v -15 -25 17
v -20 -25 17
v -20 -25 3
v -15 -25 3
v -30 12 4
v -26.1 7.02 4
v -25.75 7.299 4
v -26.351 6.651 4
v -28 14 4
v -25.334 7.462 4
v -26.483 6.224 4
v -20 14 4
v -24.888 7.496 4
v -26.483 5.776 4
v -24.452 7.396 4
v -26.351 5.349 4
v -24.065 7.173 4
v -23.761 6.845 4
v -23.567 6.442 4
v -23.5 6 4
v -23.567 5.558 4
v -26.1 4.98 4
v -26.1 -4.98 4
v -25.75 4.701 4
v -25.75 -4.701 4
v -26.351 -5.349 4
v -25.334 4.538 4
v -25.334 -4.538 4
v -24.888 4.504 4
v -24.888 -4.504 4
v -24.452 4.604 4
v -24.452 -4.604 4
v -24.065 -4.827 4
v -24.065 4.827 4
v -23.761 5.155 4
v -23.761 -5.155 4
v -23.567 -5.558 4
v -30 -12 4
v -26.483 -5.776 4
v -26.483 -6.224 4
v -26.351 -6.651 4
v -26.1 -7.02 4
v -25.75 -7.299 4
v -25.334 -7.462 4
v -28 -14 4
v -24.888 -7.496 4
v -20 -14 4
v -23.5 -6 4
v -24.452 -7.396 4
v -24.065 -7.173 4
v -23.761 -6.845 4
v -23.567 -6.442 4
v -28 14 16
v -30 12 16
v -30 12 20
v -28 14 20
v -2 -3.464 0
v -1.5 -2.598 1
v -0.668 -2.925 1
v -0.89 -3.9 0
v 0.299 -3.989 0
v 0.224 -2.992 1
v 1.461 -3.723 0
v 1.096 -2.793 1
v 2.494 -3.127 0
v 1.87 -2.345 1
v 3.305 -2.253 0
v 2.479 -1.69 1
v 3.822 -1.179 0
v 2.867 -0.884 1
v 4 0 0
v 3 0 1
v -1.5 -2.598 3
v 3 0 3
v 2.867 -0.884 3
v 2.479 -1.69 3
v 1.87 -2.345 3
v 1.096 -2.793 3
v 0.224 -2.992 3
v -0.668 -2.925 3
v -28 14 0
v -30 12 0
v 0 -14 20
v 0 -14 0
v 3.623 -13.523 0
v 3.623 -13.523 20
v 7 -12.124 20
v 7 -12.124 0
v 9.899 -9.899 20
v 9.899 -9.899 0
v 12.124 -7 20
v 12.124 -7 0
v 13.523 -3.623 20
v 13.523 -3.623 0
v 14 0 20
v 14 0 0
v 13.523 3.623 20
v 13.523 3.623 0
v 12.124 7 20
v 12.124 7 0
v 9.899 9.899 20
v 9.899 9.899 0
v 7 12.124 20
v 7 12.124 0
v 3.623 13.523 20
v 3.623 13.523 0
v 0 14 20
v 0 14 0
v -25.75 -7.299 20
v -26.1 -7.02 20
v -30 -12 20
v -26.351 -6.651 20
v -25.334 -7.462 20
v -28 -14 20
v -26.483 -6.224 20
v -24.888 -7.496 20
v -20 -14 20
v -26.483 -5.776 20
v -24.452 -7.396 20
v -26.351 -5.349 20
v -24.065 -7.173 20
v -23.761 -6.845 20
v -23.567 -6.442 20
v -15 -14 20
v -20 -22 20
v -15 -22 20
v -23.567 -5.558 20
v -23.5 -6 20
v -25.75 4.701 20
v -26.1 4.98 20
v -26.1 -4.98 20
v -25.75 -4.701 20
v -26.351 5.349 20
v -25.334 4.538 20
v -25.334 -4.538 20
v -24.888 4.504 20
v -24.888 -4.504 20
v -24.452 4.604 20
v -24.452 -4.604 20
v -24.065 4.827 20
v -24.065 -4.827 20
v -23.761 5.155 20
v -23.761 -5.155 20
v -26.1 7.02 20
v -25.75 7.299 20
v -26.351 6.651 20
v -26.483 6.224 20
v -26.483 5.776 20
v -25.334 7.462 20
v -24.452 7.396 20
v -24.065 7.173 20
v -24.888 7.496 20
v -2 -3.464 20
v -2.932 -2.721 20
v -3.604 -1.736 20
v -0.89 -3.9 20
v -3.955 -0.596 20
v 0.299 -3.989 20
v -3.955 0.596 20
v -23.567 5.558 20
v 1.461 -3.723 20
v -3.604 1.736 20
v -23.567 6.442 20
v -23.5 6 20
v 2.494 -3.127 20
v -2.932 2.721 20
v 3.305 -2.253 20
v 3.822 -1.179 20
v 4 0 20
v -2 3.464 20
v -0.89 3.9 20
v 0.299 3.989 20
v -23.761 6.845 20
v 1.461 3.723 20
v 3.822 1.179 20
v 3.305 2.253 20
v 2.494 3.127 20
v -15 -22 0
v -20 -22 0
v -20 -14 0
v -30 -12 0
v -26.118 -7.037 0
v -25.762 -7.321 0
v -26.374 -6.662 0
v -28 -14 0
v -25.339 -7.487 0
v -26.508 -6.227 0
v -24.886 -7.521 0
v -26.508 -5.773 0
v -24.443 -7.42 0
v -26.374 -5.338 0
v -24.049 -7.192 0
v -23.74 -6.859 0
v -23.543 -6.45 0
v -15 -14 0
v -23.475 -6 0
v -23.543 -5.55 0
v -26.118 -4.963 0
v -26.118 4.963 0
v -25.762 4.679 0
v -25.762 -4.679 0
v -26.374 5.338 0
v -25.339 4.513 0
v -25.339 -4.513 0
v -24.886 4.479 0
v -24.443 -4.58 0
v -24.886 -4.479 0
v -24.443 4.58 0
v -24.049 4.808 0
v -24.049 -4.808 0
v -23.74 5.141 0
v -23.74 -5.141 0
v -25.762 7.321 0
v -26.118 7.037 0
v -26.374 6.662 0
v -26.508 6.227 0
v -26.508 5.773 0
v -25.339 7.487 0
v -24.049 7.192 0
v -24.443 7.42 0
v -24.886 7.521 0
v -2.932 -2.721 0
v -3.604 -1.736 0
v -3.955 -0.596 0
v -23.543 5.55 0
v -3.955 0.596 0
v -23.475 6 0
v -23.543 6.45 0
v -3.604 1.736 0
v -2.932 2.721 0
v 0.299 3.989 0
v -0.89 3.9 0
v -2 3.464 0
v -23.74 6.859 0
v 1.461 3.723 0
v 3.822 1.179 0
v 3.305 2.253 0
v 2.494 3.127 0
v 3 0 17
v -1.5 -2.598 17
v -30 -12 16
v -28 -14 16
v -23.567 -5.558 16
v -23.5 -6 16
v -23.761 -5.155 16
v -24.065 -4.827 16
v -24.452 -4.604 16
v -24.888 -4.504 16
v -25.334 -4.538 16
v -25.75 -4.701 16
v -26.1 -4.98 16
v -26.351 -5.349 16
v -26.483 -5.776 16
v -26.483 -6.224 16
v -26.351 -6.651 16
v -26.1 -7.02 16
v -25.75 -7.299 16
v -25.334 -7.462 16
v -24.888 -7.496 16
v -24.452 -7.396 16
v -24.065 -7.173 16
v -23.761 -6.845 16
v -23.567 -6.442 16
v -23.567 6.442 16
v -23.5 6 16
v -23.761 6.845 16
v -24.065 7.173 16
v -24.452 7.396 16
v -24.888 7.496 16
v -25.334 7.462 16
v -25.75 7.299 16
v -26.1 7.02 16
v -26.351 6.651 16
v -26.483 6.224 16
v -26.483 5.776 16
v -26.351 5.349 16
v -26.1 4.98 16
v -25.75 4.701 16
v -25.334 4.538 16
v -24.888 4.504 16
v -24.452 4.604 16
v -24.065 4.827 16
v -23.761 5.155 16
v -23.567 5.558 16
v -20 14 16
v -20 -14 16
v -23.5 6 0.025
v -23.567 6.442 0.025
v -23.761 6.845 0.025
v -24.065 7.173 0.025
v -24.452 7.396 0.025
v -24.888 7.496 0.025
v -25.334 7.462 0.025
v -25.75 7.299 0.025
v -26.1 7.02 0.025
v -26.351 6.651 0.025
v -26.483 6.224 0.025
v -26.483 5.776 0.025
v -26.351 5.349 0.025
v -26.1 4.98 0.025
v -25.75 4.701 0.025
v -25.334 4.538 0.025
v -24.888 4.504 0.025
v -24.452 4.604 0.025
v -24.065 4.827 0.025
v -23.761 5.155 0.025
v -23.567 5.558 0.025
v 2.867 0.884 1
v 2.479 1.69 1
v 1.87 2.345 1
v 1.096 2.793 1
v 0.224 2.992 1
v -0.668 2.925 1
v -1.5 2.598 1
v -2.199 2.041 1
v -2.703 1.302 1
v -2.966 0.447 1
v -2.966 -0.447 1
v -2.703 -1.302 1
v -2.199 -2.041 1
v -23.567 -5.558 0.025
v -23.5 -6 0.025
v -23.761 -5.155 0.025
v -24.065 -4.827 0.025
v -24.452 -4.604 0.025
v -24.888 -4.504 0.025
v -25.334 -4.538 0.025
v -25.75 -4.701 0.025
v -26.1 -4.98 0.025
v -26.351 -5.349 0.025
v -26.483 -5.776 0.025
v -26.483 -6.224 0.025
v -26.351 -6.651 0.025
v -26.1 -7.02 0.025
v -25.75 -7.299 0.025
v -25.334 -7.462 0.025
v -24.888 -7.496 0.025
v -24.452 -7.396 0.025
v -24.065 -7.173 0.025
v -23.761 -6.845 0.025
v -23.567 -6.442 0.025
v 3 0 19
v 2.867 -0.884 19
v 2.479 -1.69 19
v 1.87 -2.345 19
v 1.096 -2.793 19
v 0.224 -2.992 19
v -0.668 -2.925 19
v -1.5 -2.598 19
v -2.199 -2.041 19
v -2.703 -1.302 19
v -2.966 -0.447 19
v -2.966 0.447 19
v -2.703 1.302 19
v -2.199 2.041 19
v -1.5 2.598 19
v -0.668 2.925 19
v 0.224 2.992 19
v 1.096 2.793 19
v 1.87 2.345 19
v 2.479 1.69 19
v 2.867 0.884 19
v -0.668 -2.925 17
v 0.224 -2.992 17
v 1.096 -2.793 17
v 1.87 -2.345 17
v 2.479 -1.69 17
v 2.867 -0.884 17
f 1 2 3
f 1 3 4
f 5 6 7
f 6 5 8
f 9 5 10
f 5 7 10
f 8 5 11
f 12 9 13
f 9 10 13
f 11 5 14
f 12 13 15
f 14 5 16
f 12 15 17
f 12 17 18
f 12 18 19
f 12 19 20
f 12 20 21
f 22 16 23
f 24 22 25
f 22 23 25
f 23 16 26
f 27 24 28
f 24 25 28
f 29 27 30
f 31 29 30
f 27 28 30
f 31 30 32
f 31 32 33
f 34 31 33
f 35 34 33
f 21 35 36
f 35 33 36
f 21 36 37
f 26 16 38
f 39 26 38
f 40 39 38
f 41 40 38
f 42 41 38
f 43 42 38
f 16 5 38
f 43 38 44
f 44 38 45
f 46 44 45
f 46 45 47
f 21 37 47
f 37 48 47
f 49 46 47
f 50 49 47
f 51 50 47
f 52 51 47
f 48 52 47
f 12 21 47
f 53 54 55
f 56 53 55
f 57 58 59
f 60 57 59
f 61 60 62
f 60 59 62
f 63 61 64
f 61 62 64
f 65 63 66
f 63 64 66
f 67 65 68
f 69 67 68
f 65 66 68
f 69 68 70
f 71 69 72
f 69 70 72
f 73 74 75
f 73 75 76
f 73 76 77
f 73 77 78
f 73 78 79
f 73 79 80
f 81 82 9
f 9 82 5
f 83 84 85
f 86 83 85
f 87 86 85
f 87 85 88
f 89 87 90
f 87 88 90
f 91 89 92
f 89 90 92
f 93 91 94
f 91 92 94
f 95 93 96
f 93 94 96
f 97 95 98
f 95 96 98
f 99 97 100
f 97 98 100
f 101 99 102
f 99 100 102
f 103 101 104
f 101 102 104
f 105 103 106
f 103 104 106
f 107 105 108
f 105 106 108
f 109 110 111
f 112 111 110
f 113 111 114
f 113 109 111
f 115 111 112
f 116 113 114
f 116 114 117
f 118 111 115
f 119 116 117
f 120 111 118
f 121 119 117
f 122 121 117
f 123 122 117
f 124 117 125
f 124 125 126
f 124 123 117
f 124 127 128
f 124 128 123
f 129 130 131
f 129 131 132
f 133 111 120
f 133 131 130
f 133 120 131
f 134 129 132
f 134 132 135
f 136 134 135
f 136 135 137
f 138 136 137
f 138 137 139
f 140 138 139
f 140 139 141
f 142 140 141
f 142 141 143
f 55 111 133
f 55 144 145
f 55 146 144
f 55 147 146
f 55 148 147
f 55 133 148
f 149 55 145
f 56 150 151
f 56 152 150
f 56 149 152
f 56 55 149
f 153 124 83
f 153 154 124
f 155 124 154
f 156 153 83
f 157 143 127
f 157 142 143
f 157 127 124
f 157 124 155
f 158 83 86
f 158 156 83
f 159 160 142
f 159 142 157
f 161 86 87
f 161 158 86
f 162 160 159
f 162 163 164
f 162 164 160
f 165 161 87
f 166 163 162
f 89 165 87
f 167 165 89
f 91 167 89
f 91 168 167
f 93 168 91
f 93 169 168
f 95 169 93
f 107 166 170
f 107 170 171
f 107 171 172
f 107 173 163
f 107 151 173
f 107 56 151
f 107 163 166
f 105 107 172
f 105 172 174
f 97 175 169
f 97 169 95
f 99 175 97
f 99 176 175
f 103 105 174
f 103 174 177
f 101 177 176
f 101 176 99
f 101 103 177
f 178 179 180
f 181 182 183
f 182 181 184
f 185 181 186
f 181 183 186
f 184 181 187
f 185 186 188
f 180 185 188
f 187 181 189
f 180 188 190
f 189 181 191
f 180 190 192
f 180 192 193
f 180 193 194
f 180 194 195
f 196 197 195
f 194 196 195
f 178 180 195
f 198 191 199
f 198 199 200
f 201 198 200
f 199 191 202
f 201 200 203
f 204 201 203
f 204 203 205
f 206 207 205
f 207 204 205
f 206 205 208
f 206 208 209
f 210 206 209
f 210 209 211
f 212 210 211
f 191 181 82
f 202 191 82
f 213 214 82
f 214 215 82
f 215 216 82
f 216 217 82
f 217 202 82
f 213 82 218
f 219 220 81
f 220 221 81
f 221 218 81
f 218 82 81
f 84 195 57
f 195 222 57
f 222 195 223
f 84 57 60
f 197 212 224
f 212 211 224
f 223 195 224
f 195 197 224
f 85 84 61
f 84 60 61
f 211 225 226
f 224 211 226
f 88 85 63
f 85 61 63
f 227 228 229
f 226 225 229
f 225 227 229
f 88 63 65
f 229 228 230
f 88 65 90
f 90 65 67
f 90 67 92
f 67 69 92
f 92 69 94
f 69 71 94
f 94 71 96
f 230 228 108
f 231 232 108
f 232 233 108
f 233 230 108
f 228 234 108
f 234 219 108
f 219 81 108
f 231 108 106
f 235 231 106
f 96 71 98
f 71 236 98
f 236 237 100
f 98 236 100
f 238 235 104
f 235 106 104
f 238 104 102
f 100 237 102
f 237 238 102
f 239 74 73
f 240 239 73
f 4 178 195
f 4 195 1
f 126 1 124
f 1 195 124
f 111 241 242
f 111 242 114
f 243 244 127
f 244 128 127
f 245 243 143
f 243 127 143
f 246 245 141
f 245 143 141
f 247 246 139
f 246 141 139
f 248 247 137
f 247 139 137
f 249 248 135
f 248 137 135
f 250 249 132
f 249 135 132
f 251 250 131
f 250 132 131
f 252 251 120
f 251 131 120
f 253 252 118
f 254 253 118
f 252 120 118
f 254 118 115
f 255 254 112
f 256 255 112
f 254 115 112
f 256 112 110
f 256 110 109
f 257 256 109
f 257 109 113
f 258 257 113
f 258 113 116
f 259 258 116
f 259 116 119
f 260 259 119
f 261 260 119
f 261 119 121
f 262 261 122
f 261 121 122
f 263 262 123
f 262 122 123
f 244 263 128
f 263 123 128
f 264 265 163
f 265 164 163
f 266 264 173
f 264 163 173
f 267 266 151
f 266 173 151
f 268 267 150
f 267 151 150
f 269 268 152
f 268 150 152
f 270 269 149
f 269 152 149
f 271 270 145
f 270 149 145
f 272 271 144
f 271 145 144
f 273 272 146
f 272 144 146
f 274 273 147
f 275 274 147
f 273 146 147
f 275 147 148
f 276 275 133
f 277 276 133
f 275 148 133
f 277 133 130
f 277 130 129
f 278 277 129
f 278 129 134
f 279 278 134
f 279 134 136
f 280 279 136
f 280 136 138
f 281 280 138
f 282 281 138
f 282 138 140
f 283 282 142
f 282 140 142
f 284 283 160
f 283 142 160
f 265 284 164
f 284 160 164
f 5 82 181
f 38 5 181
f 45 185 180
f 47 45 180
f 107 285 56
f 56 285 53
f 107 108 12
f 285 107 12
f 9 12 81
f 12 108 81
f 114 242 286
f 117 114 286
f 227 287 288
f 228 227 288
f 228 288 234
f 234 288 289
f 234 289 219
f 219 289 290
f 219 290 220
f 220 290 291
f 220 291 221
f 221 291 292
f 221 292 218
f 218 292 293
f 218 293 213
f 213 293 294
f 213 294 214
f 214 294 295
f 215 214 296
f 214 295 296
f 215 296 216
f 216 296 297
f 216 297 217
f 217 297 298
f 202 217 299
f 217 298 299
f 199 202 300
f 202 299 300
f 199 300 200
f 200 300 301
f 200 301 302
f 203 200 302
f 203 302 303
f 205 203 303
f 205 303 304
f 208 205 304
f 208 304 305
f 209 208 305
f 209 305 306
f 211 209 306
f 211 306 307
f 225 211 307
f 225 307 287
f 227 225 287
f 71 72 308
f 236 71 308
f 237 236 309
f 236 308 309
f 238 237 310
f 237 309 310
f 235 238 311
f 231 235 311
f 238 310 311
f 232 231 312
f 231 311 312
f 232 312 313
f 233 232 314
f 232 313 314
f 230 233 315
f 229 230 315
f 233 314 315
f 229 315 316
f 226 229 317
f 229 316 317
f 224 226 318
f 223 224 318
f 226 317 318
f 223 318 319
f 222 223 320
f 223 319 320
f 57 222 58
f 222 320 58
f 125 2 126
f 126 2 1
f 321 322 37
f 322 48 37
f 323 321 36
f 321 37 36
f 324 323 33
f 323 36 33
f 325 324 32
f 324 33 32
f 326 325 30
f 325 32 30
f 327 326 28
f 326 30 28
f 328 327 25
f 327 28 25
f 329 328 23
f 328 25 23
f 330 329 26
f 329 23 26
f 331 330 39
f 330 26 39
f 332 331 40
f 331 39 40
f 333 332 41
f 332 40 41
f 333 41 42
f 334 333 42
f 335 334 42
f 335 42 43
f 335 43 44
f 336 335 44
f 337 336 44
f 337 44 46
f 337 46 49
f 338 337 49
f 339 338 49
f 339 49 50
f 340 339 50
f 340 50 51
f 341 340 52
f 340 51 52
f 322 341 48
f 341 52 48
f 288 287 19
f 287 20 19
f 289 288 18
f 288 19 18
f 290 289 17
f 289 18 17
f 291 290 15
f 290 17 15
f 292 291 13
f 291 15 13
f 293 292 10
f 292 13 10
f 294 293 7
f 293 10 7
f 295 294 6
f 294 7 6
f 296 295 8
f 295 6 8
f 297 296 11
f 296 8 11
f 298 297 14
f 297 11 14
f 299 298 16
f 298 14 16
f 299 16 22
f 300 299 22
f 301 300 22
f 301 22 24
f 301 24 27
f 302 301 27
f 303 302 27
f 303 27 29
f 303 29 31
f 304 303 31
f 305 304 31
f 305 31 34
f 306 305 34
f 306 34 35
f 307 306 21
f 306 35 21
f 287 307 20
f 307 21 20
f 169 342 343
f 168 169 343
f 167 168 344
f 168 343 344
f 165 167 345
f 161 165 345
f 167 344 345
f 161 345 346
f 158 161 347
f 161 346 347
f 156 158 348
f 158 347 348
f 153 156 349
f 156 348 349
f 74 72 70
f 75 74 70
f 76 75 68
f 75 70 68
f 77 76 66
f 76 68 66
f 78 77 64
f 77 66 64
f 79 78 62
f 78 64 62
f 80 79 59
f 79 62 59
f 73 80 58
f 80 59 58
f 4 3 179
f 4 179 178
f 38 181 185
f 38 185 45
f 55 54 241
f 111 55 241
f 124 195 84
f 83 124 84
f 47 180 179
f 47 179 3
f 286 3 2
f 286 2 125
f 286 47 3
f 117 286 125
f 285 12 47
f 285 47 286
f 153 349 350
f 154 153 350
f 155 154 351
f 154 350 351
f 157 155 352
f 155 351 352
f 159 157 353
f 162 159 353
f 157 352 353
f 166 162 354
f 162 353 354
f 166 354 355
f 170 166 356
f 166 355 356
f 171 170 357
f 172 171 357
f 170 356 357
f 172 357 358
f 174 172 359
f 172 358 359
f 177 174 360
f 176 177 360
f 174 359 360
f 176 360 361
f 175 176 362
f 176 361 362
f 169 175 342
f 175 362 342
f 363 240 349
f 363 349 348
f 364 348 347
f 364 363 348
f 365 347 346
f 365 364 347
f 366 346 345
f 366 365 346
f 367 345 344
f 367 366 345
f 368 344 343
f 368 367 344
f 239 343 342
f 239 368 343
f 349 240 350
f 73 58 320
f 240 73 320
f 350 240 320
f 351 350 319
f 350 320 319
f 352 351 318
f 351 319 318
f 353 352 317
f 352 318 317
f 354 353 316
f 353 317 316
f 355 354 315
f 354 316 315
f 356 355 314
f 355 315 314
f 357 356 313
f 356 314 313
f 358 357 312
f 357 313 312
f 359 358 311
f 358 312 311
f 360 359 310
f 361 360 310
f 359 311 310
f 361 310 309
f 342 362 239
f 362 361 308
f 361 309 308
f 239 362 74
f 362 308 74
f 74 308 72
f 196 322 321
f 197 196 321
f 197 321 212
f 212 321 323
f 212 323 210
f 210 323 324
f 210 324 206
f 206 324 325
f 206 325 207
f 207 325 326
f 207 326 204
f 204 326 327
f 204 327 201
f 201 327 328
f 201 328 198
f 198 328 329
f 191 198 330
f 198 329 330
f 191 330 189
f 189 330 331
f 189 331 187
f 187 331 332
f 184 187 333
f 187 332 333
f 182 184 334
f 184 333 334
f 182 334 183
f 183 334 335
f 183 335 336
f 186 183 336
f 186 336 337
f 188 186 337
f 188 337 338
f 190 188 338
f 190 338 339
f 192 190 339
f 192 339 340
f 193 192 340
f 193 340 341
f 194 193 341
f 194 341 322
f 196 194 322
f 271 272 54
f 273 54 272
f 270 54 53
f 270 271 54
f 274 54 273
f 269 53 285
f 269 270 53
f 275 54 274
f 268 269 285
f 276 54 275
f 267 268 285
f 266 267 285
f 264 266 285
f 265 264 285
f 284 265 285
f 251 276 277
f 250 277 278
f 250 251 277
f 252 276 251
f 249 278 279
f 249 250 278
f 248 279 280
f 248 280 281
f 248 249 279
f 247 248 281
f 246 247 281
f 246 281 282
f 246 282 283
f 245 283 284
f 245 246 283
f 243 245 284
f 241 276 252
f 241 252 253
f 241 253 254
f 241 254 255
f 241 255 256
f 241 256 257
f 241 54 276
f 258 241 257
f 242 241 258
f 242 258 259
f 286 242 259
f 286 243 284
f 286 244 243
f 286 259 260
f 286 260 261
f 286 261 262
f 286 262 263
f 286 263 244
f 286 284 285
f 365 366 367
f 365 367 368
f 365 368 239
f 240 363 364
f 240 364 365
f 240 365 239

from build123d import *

# Parameters (mm, degrees)
EXTRUDE_1_DEPTH       = 20
CUT_EXTRUDE_1_DEPTH   = 39.678159
SKETCH_5_R            = 3
CUT_EXTRUDE_2_DEPTH   = 3
SKETCH_6_W            = 10
SKETCH_6_H            = 12
CUT_EXTRUDE_3_DEPTH   = 46.650849
F_3_0MM_1_D           = 3
F_3_0MM_1_CSINK_D     = 3.05
F_3_0MM_1_CSINK_ANGLE = 90
CHAMFER_2_SIZE        = 2
CUT_EXTRUDE_START     = -3
SKETCH_9_R            = 3
CUT_EXTRUDE_5_DEPTH   = 3
SKETCH_10_W           = 5
SKETCH_10_H           = 20
EXTRUDE_2_DEPTH       = 11
CHAMFER_3_SIZE        = 3
CHAMFER_4_SIZE        = 1


with BuildPart() as part:
    # 草图1 → 凸台-拉伸1 (new body)
    with BuildSketch(Plane.XY):
        with BuildLine():
            Line((0, 14), (-30, 14))
            Line((-30, 14), (-30, -14))
            Line((-30, -14), (0, -14))
            ThreePointArc((0, -14), (14, 0), (0, 14))
        make_face()
    extrude(amount=EXTRUDE_1_DEPTH)

    # 草图3 → 切除-拉伸1 (cut, through all)
    with BuildSketch(Plane(origin=(0, 0, 0), x_dir=(-1, 0, 0), z_dir=(0, 0, -1))):
        with BuildLine():
            Line((-3, 0), (1.5, -2.598076))
            ThreePointArc((1.5, -2.598076), (1.5, 2.598076), (-3, 0))
        make_face()
    extrude(amount=-CUT_EXTRUDE_1_DEPTH, mode=Mode.SUBTRACT)

    # 草图5 → 切除-拉伸2 (cut)
    with BuildSketch(Plane(origin=(0, 0, 0), x_dir=(-1, 0, 0), z_dir=(0, 0, -1))):
        Circle(SKETCH_5_R)
    extrude(amount=-CUT_EXTRUDE_2_DEPTH, mode=Mode.SUBTRACT)

    # 草图6 → 切除-拉伸3 (cut, through all)
    with BuildSketch(Plane.XZ.offset(14)):
        with Locations((-25, 10)):
            Rectangle(SKETCH_6_W, SKETCH_6_H)
    extrude(amount=-CUT_EXTRUDE_3_DEPTH, mode=Mode.SUBTRACT)

    # Ø3.0mm 暗销孔1 (through all)
    with Locations(Plane(origin=(-25, 6, 0), x_dir=(-1, 0, 0), z_dir=(0, 0, -1))):
        with Locations((0, 0), (0, -12)):
            CounterSinkHole(F_3_0MM_1_D / 2, F_3_0MM_1_CSINK_D / 2, counter_sink_angle=F_3_0MM_1_CSINK_ANGLE)

    # 倒角2
    chamfer_2_edges = [part.edges().sort_by_distance(p)[0] for p in [
        (-30, -14, 2),
        (-30, 14, 2),
        (-30, -14, 18),
        (-30, 14, 18),
    ]]
    chamfer(chamfer_2_edges, length=CHAMFER_2_SIZE)

    # 草图9 → 切除-拉伸5 (cut)
    with BuildSketch(Plane.XY.offset(20).offset(CUT_EXTRUDE_START)):
        with Locations(Location((0, 0, 0), (0, 0, 180))):
            Circle(SKETCH_9_R)
    extrude(amount=CUT_EXTRUDE_5_DEPTH, mode=Mode.SUBTRACT)

    # 草图10 → 凸台-拉伸2 (add)
    with BuildSketch(Plane.XZ.offset(14)):
        with Locations((-17.5, 10)):
            Rectangle(SKETCH_10_W, SKETCH_10_H)
    extrude(amount=EXTRUDE_2_DEPTH)

    # 倒角3
    chamfer_3_edges = [part.edges().sort_by_distance(p)[0] for p in [
        (-17.5, -25, 0),
        (-17.5, -25, 20),
    ]]
    chamfer(chamfer_3_edges, length=CHAMFER_3_SIZE)

    # 倒角4
    chamfer_4_edges = [part.edges().sort_by_distance(p)[0] for p in [
        (-2.598076, -1.5, 20),
        (1.5, 2.598076, 0),
    ]]
    chamfer(chamfer_4_edges, length=CHAMFER_4_SIZE)


solid = part.part
